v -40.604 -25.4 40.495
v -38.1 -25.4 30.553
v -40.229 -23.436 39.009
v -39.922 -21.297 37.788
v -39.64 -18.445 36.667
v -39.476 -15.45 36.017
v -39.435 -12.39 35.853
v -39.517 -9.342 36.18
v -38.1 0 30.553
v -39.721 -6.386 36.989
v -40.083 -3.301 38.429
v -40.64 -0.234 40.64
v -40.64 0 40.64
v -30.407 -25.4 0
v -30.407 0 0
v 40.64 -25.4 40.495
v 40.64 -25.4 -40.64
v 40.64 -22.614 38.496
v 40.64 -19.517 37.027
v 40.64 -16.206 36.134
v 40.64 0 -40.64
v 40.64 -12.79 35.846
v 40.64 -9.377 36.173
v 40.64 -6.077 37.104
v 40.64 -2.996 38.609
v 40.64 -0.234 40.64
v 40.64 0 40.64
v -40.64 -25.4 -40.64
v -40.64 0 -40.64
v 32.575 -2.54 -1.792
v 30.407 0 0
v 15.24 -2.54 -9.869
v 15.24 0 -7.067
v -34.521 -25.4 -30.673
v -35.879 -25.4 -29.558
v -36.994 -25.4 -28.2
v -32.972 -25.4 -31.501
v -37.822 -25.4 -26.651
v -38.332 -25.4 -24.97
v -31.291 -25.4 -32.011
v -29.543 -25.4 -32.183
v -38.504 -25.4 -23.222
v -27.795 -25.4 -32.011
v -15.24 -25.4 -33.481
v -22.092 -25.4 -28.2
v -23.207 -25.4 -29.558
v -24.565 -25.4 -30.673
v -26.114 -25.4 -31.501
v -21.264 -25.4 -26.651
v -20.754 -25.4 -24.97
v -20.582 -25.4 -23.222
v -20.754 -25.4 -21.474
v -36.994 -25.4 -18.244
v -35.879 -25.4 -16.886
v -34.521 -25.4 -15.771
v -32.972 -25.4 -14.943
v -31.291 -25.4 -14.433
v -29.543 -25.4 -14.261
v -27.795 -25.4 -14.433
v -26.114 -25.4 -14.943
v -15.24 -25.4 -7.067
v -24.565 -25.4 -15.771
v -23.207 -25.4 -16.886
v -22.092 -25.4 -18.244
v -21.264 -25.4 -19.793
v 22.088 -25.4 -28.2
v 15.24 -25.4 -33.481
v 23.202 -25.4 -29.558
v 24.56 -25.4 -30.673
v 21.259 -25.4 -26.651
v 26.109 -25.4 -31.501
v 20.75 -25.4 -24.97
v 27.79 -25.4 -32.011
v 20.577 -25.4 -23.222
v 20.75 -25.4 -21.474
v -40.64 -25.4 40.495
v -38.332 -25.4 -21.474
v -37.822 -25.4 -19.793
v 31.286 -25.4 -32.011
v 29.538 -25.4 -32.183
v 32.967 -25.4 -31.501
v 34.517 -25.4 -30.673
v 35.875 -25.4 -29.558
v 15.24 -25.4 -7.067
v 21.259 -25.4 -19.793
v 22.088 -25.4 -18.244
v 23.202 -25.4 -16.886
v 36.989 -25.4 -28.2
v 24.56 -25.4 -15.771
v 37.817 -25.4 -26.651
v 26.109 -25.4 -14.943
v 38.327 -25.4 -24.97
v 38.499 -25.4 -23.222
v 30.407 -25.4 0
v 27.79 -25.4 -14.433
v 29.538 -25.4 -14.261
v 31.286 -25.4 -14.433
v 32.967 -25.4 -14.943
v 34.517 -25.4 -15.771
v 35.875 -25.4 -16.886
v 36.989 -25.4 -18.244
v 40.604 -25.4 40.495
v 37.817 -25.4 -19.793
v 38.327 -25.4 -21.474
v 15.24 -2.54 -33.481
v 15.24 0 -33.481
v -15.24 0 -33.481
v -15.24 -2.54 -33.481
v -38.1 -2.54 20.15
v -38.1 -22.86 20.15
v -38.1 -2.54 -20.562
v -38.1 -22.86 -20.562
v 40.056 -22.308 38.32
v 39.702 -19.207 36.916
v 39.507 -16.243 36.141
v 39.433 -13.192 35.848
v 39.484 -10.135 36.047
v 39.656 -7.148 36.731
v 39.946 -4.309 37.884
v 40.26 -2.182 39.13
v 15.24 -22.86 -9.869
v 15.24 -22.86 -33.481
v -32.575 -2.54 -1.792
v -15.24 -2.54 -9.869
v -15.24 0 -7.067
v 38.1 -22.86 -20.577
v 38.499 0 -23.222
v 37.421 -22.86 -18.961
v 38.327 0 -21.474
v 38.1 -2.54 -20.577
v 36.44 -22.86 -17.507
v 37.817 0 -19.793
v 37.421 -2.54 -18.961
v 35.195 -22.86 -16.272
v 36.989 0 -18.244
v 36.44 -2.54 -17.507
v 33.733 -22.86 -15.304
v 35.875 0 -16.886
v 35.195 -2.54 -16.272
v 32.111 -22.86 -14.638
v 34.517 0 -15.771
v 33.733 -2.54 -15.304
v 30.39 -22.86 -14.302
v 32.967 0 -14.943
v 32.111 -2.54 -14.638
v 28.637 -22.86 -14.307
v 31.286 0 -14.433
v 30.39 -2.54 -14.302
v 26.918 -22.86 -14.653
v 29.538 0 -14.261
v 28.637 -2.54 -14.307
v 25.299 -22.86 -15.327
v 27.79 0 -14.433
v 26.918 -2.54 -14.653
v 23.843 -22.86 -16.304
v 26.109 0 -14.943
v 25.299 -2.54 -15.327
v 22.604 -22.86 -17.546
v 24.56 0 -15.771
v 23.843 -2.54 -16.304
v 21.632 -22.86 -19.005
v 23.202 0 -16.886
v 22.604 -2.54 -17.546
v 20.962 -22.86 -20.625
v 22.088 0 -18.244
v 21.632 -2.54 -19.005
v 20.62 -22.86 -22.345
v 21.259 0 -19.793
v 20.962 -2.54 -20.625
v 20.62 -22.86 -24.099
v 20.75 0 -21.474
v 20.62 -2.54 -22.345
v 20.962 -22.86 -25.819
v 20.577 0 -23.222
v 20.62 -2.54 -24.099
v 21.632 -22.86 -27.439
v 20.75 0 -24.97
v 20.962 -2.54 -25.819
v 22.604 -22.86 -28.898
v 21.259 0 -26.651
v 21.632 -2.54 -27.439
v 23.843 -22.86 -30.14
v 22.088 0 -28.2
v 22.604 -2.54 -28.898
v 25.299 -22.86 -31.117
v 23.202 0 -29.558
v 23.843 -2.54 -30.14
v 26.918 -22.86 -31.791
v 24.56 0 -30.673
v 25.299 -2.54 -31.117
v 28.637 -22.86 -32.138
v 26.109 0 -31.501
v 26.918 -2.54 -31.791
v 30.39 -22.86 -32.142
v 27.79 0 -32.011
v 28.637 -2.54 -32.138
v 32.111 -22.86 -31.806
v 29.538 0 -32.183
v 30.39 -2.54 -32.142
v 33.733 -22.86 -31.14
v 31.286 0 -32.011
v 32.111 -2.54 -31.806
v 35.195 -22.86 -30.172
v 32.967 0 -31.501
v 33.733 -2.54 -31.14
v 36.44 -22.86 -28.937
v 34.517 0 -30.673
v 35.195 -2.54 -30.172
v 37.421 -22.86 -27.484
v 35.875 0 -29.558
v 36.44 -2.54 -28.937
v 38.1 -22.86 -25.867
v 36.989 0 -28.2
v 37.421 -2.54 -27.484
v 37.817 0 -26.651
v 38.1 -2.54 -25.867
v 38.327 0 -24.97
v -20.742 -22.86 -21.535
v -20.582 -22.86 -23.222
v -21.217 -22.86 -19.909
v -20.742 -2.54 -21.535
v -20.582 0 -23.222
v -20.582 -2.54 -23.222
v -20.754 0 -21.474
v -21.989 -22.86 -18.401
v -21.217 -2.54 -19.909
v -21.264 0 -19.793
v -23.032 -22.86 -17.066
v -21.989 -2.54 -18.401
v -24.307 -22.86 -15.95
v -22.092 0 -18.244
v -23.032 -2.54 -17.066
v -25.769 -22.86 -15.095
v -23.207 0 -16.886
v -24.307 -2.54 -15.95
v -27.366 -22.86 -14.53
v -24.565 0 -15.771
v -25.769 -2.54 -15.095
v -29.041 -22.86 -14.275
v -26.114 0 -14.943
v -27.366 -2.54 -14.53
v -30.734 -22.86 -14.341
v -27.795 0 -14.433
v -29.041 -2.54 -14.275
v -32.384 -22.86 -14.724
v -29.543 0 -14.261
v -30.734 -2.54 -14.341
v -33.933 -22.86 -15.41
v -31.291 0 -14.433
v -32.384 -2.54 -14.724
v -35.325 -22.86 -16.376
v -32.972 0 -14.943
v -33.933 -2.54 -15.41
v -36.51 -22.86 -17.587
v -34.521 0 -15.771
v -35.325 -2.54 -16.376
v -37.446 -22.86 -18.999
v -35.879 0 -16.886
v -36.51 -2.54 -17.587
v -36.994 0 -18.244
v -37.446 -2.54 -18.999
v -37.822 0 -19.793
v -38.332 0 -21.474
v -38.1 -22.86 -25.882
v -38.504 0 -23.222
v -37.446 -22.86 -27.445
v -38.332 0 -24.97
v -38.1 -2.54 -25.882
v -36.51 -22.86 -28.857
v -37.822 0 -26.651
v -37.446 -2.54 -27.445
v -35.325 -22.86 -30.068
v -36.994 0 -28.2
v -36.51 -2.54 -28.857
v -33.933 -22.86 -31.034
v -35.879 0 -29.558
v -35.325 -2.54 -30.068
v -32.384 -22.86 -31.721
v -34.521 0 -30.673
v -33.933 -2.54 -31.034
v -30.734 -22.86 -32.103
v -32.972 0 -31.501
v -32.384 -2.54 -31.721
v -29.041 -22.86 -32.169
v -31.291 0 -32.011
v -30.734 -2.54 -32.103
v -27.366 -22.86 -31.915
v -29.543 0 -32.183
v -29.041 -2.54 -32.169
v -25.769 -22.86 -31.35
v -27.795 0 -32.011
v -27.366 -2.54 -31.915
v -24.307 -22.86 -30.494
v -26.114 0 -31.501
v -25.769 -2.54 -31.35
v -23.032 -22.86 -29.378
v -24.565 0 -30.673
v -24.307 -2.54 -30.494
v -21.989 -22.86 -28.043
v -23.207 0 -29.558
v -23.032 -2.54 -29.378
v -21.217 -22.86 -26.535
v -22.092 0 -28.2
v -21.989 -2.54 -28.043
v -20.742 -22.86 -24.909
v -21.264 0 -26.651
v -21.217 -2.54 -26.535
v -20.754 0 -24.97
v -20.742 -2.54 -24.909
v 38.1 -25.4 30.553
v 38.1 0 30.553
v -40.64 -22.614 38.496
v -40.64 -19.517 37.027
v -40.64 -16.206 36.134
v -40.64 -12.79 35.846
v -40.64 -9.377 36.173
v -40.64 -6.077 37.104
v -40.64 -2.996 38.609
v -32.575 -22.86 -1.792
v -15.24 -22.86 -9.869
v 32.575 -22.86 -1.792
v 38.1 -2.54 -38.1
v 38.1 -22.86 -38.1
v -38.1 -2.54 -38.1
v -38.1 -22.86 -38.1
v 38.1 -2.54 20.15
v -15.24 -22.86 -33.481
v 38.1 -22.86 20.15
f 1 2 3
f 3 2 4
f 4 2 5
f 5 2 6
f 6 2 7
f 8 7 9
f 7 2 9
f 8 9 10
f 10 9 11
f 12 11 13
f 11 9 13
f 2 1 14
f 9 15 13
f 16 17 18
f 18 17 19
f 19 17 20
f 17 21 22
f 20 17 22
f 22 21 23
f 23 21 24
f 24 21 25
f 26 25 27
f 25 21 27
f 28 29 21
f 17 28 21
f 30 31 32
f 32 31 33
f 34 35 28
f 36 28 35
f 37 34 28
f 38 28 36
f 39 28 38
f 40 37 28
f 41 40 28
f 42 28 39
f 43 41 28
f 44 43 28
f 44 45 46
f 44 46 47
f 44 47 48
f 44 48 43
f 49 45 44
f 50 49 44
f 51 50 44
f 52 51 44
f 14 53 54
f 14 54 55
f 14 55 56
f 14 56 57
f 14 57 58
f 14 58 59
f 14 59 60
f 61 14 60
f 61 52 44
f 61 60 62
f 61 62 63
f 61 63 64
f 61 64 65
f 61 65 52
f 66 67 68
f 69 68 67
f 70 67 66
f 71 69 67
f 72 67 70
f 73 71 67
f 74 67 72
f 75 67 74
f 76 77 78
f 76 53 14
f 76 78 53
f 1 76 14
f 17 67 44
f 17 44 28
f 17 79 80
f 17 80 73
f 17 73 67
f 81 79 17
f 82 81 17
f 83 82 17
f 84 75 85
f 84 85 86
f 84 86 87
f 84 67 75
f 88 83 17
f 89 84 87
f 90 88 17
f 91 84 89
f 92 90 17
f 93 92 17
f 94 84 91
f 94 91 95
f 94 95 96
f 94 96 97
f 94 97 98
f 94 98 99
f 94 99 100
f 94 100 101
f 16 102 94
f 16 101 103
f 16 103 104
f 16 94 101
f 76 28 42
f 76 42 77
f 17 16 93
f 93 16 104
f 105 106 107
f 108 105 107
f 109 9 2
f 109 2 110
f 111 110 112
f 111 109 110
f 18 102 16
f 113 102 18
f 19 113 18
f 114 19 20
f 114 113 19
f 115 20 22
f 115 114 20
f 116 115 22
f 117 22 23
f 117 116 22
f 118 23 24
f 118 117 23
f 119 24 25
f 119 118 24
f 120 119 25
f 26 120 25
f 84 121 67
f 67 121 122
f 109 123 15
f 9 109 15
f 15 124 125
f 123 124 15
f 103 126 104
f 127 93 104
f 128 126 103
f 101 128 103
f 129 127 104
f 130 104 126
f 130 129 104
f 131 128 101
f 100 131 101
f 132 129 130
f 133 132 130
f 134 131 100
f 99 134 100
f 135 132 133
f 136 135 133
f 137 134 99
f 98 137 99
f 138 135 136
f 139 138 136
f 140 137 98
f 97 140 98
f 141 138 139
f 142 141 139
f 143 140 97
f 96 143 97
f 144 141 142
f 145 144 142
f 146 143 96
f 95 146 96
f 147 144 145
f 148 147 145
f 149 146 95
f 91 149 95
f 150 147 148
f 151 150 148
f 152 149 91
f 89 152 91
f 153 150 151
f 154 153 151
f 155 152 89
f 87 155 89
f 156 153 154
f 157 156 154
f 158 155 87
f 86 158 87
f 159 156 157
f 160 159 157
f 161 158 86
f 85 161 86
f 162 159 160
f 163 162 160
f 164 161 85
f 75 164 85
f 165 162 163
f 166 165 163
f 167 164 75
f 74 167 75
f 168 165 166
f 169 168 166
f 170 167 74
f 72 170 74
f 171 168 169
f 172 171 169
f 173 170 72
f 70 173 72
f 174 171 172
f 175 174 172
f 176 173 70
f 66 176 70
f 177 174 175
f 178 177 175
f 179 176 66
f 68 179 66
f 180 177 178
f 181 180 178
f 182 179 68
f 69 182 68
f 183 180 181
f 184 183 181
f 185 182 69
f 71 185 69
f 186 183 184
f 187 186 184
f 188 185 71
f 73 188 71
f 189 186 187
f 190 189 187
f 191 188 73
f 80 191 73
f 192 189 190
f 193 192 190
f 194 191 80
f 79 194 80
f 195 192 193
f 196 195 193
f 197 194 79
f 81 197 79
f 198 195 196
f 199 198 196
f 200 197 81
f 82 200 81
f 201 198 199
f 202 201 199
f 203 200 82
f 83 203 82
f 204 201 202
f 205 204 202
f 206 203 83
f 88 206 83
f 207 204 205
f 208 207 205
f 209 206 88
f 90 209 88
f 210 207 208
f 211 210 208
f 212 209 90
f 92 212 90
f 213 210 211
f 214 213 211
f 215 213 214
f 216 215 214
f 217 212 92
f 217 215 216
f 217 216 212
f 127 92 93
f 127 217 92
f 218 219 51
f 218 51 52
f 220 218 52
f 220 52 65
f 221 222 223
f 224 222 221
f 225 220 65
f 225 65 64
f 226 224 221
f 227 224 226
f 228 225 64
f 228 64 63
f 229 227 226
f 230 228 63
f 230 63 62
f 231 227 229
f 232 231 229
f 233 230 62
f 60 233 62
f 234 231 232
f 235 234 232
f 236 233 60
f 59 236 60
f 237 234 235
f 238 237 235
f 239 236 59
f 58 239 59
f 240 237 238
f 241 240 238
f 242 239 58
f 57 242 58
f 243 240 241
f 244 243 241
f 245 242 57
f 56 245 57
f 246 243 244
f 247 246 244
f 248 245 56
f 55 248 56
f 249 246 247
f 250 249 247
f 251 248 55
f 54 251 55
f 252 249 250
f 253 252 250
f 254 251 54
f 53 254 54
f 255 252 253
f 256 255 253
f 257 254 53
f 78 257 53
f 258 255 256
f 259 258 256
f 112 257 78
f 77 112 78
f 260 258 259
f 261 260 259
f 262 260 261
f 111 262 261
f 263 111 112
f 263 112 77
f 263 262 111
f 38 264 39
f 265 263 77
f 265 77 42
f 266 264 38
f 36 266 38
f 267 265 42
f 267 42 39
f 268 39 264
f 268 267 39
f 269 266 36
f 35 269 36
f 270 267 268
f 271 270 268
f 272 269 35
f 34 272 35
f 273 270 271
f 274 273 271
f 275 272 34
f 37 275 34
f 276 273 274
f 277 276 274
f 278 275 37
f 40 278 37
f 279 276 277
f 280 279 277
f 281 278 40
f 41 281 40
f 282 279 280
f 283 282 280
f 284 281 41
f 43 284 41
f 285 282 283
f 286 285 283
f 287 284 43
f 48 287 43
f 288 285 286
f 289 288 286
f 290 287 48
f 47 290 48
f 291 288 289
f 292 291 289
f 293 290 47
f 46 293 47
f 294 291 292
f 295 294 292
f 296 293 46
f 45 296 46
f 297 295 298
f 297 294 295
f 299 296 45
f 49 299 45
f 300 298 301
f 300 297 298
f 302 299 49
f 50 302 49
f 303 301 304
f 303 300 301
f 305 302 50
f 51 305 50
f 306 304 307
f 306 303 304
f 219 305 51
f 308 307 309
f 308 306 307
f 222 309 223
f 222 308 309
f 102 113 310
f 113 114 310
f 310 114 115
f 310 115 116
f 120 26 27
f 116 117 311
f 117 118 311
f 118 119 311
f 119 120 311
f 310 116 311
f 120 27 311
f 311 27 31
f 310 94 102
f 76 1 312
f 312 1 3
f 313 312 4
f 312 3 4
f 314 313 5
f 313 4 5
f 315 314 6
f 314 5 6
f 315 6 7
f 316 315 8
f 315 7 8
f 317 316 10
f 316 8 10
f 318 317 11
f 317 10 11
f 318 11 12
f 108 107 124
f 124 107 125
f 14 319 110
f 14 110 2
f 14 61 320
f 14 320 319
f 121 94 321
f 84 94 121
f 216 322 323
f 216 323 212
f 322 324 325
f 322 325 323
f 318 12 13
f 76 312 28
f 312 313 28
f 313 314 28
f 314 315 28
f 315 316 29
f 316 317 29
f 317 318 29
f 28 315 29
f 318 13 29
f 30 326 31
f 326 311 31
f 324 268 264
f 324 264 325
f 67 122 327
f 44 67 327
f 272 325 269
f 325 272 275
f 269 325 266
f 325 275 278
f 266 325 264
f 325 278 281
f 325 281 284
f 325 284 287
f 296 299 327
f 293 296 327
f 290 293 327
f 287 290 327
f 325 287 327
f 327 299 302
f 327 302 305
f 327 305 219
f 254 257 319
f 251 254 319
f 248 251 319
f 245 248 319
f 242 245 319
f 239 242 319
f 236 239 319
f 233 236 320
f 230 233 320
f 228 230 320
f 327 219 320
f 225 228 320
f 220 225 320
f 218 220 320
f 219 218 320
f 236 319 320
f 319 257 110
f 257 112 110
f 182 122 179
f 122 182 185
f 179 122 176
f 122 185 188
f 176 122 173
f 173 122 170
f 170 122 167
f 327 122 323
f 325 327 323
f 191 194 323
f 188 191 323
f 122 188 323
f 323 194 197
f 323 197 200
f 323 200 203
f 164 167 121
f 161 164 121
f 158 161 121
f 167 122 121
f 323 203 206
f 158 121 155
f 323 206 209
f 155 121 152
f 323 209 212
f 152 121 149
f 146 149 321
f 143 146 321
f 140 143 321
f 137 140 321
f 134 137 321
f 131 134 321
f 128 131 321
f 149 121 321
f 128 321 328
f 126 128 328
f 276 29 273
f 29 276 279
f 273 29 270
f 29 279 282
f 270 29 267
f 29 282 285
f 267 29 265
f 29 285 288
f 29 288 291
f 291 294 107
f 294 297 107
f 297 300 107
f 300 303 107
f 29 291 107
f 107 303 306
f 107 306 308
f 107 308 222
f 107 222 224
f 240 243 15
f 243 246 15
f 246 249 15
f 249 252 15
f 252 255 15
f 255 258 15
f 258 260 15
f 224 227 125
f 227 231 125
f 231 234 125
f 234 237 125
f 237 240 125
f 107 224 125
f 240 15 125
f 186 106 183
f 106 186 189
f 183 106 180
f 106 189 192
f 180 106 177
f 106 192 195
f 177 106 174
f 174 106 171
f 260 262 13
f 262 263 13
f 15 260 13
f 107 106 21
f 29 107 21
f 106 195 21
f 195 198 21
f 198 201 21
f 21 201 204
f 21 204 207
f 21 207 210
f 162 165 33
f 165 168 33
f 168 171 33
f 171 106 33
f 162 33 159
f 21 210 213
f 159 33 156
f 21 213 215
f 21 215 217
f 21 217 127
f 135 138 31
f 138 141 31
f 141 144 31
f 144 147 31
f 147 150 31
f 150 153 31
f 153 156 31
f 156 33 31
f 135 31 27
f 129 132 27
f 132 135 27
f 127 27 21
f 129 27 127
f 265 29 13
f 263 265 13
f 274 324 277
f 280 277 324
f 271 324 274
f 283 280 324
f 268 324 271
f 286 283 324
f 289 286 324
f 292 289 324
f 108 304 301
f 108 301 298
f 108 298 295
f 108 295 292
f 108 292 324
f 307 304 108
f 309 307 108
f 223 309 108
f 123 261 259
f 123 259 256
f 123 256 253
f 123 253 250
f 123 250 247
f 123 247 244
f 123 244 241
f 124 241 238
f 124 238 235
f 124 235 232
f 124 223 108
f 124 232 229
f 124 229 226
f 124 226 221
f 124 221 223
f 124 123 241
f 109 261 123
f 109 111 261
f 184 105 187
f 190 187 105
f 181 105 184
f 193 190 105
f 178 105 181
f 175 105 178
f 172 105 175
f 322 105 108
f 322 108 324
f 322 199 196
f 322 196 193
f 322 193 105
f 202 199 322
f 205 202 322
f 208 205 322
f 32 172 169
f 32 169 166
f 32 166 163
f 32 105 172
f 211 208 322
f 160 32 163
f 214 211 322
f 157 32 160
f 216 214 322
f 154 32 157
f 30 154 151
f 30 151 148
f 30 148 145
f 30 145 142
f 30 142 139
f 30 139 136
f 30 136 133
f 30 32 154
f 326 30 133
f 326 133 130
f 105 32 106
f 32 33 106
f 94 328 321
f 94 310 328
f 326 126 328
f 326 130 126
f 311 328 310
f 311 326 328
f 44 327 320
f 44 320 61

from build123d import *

# Parameters (mm, degrees)
F1_DEPTH      = 25.4
F2_T          = -2.54
F3_R          = 8.9609270722
F4_DEPTH      = 105.41
F5_SIZE       = 2.53999
F6_R          = 19.1294081244
F7_DEPTH      = 254
F7_DEPTH_BACK = 170.942


# Not quite as in the source:
# - a fillet or chamfer is up to 0.001 mm smaller than in the source, because OpenCascade refuses the exact size


with BuildPart() as f1:
    # F0 (on Front) → F1 (new body)
    with BuildSketch(Plane.XZ):
        Polygon((40.64, -40.64), (40.64, 0), (30.4068718106, 0), (15.24, -7.0667252876), (15.24, -33.4807746112), (-15.24, -33.4807746112), (-15.24, -7.0667252876), (-30.4068718106, 0), (-40.64, 0), (-40.64, -40.64), align=None)
        Polygon((-30.4068718106, 0), (-40.64, 40.64), (-40.64, 0), align=None)
        Polygon((40.64, 0), (40.64, 40.64), (30.4068718106, 0), align=None)
    extrude(amount=F1_DEPTH)

    # F2
    f2_openings = [f1.faces().sort_by_distance(p)[0] for p in [
        (35.523436, -12.7, 20.32),
        (22.823436, -12.7, -3.533363),
        (15.24, -12.7, -20.27375),
        (0, -12.7, -33.480775),
        (-35.523436, -12.7, 20.32),
        (-22.823436, -12.7, -3.533363),
        (-15.24, -12.7, -20.27375),
    ]]
    offset(amount=F2_T, openings=f2_openings)

    # F3 (on Front) → F4 (cut)
    with BuildSketch(Plane.XZ):
        with Locations((-29.5430510807, -23.22207205)):
            Circle(F3_R)
        with Locations((29.538249597, -23.22207205)):
            Circle(F3_R)
    extrude(amount=F4_DEPTH, mode=Mode.SUBTRACT)

    # F5 (size 2.54 in the source; OpenCascade refuses exactly that, so slightly less here)
    f5_edges = [f1.edges().sort_by_distance(p)[0] for p in [
        (-34.253436, -22.86, 15.276303),
        (-22.823436, -22.86, -3.533363),
        (-34.253436, -2.54, 15.276303),
        (-22.823436, -2.54, -3.533363),
        (22.823436, -2.54, -3.533363),
        (34.253436, -2.54, 15.276303),
        (34.253436, -22.86, 15.276303),
        (22.823436, -22.86, -3.533363),
    ]]
    chamfer(f5_edges, length=F5_SIZE)

    # F6 (on Right) → F7 (cut, two sides)
    with BuildSketch(Plane.YZ) as f7_sk:
        with Locations((-12.8998877481, 54.9755766988)):
            Circle(F6_R)
    extrude(amount=-F7_DEPTH, mode=Mode.SUBTRACT)
    extrude(f7_sk.sketch, amount=F7_DEPTH_BACK, mode=Mode.SUBTRACT)


solid = f1.part
